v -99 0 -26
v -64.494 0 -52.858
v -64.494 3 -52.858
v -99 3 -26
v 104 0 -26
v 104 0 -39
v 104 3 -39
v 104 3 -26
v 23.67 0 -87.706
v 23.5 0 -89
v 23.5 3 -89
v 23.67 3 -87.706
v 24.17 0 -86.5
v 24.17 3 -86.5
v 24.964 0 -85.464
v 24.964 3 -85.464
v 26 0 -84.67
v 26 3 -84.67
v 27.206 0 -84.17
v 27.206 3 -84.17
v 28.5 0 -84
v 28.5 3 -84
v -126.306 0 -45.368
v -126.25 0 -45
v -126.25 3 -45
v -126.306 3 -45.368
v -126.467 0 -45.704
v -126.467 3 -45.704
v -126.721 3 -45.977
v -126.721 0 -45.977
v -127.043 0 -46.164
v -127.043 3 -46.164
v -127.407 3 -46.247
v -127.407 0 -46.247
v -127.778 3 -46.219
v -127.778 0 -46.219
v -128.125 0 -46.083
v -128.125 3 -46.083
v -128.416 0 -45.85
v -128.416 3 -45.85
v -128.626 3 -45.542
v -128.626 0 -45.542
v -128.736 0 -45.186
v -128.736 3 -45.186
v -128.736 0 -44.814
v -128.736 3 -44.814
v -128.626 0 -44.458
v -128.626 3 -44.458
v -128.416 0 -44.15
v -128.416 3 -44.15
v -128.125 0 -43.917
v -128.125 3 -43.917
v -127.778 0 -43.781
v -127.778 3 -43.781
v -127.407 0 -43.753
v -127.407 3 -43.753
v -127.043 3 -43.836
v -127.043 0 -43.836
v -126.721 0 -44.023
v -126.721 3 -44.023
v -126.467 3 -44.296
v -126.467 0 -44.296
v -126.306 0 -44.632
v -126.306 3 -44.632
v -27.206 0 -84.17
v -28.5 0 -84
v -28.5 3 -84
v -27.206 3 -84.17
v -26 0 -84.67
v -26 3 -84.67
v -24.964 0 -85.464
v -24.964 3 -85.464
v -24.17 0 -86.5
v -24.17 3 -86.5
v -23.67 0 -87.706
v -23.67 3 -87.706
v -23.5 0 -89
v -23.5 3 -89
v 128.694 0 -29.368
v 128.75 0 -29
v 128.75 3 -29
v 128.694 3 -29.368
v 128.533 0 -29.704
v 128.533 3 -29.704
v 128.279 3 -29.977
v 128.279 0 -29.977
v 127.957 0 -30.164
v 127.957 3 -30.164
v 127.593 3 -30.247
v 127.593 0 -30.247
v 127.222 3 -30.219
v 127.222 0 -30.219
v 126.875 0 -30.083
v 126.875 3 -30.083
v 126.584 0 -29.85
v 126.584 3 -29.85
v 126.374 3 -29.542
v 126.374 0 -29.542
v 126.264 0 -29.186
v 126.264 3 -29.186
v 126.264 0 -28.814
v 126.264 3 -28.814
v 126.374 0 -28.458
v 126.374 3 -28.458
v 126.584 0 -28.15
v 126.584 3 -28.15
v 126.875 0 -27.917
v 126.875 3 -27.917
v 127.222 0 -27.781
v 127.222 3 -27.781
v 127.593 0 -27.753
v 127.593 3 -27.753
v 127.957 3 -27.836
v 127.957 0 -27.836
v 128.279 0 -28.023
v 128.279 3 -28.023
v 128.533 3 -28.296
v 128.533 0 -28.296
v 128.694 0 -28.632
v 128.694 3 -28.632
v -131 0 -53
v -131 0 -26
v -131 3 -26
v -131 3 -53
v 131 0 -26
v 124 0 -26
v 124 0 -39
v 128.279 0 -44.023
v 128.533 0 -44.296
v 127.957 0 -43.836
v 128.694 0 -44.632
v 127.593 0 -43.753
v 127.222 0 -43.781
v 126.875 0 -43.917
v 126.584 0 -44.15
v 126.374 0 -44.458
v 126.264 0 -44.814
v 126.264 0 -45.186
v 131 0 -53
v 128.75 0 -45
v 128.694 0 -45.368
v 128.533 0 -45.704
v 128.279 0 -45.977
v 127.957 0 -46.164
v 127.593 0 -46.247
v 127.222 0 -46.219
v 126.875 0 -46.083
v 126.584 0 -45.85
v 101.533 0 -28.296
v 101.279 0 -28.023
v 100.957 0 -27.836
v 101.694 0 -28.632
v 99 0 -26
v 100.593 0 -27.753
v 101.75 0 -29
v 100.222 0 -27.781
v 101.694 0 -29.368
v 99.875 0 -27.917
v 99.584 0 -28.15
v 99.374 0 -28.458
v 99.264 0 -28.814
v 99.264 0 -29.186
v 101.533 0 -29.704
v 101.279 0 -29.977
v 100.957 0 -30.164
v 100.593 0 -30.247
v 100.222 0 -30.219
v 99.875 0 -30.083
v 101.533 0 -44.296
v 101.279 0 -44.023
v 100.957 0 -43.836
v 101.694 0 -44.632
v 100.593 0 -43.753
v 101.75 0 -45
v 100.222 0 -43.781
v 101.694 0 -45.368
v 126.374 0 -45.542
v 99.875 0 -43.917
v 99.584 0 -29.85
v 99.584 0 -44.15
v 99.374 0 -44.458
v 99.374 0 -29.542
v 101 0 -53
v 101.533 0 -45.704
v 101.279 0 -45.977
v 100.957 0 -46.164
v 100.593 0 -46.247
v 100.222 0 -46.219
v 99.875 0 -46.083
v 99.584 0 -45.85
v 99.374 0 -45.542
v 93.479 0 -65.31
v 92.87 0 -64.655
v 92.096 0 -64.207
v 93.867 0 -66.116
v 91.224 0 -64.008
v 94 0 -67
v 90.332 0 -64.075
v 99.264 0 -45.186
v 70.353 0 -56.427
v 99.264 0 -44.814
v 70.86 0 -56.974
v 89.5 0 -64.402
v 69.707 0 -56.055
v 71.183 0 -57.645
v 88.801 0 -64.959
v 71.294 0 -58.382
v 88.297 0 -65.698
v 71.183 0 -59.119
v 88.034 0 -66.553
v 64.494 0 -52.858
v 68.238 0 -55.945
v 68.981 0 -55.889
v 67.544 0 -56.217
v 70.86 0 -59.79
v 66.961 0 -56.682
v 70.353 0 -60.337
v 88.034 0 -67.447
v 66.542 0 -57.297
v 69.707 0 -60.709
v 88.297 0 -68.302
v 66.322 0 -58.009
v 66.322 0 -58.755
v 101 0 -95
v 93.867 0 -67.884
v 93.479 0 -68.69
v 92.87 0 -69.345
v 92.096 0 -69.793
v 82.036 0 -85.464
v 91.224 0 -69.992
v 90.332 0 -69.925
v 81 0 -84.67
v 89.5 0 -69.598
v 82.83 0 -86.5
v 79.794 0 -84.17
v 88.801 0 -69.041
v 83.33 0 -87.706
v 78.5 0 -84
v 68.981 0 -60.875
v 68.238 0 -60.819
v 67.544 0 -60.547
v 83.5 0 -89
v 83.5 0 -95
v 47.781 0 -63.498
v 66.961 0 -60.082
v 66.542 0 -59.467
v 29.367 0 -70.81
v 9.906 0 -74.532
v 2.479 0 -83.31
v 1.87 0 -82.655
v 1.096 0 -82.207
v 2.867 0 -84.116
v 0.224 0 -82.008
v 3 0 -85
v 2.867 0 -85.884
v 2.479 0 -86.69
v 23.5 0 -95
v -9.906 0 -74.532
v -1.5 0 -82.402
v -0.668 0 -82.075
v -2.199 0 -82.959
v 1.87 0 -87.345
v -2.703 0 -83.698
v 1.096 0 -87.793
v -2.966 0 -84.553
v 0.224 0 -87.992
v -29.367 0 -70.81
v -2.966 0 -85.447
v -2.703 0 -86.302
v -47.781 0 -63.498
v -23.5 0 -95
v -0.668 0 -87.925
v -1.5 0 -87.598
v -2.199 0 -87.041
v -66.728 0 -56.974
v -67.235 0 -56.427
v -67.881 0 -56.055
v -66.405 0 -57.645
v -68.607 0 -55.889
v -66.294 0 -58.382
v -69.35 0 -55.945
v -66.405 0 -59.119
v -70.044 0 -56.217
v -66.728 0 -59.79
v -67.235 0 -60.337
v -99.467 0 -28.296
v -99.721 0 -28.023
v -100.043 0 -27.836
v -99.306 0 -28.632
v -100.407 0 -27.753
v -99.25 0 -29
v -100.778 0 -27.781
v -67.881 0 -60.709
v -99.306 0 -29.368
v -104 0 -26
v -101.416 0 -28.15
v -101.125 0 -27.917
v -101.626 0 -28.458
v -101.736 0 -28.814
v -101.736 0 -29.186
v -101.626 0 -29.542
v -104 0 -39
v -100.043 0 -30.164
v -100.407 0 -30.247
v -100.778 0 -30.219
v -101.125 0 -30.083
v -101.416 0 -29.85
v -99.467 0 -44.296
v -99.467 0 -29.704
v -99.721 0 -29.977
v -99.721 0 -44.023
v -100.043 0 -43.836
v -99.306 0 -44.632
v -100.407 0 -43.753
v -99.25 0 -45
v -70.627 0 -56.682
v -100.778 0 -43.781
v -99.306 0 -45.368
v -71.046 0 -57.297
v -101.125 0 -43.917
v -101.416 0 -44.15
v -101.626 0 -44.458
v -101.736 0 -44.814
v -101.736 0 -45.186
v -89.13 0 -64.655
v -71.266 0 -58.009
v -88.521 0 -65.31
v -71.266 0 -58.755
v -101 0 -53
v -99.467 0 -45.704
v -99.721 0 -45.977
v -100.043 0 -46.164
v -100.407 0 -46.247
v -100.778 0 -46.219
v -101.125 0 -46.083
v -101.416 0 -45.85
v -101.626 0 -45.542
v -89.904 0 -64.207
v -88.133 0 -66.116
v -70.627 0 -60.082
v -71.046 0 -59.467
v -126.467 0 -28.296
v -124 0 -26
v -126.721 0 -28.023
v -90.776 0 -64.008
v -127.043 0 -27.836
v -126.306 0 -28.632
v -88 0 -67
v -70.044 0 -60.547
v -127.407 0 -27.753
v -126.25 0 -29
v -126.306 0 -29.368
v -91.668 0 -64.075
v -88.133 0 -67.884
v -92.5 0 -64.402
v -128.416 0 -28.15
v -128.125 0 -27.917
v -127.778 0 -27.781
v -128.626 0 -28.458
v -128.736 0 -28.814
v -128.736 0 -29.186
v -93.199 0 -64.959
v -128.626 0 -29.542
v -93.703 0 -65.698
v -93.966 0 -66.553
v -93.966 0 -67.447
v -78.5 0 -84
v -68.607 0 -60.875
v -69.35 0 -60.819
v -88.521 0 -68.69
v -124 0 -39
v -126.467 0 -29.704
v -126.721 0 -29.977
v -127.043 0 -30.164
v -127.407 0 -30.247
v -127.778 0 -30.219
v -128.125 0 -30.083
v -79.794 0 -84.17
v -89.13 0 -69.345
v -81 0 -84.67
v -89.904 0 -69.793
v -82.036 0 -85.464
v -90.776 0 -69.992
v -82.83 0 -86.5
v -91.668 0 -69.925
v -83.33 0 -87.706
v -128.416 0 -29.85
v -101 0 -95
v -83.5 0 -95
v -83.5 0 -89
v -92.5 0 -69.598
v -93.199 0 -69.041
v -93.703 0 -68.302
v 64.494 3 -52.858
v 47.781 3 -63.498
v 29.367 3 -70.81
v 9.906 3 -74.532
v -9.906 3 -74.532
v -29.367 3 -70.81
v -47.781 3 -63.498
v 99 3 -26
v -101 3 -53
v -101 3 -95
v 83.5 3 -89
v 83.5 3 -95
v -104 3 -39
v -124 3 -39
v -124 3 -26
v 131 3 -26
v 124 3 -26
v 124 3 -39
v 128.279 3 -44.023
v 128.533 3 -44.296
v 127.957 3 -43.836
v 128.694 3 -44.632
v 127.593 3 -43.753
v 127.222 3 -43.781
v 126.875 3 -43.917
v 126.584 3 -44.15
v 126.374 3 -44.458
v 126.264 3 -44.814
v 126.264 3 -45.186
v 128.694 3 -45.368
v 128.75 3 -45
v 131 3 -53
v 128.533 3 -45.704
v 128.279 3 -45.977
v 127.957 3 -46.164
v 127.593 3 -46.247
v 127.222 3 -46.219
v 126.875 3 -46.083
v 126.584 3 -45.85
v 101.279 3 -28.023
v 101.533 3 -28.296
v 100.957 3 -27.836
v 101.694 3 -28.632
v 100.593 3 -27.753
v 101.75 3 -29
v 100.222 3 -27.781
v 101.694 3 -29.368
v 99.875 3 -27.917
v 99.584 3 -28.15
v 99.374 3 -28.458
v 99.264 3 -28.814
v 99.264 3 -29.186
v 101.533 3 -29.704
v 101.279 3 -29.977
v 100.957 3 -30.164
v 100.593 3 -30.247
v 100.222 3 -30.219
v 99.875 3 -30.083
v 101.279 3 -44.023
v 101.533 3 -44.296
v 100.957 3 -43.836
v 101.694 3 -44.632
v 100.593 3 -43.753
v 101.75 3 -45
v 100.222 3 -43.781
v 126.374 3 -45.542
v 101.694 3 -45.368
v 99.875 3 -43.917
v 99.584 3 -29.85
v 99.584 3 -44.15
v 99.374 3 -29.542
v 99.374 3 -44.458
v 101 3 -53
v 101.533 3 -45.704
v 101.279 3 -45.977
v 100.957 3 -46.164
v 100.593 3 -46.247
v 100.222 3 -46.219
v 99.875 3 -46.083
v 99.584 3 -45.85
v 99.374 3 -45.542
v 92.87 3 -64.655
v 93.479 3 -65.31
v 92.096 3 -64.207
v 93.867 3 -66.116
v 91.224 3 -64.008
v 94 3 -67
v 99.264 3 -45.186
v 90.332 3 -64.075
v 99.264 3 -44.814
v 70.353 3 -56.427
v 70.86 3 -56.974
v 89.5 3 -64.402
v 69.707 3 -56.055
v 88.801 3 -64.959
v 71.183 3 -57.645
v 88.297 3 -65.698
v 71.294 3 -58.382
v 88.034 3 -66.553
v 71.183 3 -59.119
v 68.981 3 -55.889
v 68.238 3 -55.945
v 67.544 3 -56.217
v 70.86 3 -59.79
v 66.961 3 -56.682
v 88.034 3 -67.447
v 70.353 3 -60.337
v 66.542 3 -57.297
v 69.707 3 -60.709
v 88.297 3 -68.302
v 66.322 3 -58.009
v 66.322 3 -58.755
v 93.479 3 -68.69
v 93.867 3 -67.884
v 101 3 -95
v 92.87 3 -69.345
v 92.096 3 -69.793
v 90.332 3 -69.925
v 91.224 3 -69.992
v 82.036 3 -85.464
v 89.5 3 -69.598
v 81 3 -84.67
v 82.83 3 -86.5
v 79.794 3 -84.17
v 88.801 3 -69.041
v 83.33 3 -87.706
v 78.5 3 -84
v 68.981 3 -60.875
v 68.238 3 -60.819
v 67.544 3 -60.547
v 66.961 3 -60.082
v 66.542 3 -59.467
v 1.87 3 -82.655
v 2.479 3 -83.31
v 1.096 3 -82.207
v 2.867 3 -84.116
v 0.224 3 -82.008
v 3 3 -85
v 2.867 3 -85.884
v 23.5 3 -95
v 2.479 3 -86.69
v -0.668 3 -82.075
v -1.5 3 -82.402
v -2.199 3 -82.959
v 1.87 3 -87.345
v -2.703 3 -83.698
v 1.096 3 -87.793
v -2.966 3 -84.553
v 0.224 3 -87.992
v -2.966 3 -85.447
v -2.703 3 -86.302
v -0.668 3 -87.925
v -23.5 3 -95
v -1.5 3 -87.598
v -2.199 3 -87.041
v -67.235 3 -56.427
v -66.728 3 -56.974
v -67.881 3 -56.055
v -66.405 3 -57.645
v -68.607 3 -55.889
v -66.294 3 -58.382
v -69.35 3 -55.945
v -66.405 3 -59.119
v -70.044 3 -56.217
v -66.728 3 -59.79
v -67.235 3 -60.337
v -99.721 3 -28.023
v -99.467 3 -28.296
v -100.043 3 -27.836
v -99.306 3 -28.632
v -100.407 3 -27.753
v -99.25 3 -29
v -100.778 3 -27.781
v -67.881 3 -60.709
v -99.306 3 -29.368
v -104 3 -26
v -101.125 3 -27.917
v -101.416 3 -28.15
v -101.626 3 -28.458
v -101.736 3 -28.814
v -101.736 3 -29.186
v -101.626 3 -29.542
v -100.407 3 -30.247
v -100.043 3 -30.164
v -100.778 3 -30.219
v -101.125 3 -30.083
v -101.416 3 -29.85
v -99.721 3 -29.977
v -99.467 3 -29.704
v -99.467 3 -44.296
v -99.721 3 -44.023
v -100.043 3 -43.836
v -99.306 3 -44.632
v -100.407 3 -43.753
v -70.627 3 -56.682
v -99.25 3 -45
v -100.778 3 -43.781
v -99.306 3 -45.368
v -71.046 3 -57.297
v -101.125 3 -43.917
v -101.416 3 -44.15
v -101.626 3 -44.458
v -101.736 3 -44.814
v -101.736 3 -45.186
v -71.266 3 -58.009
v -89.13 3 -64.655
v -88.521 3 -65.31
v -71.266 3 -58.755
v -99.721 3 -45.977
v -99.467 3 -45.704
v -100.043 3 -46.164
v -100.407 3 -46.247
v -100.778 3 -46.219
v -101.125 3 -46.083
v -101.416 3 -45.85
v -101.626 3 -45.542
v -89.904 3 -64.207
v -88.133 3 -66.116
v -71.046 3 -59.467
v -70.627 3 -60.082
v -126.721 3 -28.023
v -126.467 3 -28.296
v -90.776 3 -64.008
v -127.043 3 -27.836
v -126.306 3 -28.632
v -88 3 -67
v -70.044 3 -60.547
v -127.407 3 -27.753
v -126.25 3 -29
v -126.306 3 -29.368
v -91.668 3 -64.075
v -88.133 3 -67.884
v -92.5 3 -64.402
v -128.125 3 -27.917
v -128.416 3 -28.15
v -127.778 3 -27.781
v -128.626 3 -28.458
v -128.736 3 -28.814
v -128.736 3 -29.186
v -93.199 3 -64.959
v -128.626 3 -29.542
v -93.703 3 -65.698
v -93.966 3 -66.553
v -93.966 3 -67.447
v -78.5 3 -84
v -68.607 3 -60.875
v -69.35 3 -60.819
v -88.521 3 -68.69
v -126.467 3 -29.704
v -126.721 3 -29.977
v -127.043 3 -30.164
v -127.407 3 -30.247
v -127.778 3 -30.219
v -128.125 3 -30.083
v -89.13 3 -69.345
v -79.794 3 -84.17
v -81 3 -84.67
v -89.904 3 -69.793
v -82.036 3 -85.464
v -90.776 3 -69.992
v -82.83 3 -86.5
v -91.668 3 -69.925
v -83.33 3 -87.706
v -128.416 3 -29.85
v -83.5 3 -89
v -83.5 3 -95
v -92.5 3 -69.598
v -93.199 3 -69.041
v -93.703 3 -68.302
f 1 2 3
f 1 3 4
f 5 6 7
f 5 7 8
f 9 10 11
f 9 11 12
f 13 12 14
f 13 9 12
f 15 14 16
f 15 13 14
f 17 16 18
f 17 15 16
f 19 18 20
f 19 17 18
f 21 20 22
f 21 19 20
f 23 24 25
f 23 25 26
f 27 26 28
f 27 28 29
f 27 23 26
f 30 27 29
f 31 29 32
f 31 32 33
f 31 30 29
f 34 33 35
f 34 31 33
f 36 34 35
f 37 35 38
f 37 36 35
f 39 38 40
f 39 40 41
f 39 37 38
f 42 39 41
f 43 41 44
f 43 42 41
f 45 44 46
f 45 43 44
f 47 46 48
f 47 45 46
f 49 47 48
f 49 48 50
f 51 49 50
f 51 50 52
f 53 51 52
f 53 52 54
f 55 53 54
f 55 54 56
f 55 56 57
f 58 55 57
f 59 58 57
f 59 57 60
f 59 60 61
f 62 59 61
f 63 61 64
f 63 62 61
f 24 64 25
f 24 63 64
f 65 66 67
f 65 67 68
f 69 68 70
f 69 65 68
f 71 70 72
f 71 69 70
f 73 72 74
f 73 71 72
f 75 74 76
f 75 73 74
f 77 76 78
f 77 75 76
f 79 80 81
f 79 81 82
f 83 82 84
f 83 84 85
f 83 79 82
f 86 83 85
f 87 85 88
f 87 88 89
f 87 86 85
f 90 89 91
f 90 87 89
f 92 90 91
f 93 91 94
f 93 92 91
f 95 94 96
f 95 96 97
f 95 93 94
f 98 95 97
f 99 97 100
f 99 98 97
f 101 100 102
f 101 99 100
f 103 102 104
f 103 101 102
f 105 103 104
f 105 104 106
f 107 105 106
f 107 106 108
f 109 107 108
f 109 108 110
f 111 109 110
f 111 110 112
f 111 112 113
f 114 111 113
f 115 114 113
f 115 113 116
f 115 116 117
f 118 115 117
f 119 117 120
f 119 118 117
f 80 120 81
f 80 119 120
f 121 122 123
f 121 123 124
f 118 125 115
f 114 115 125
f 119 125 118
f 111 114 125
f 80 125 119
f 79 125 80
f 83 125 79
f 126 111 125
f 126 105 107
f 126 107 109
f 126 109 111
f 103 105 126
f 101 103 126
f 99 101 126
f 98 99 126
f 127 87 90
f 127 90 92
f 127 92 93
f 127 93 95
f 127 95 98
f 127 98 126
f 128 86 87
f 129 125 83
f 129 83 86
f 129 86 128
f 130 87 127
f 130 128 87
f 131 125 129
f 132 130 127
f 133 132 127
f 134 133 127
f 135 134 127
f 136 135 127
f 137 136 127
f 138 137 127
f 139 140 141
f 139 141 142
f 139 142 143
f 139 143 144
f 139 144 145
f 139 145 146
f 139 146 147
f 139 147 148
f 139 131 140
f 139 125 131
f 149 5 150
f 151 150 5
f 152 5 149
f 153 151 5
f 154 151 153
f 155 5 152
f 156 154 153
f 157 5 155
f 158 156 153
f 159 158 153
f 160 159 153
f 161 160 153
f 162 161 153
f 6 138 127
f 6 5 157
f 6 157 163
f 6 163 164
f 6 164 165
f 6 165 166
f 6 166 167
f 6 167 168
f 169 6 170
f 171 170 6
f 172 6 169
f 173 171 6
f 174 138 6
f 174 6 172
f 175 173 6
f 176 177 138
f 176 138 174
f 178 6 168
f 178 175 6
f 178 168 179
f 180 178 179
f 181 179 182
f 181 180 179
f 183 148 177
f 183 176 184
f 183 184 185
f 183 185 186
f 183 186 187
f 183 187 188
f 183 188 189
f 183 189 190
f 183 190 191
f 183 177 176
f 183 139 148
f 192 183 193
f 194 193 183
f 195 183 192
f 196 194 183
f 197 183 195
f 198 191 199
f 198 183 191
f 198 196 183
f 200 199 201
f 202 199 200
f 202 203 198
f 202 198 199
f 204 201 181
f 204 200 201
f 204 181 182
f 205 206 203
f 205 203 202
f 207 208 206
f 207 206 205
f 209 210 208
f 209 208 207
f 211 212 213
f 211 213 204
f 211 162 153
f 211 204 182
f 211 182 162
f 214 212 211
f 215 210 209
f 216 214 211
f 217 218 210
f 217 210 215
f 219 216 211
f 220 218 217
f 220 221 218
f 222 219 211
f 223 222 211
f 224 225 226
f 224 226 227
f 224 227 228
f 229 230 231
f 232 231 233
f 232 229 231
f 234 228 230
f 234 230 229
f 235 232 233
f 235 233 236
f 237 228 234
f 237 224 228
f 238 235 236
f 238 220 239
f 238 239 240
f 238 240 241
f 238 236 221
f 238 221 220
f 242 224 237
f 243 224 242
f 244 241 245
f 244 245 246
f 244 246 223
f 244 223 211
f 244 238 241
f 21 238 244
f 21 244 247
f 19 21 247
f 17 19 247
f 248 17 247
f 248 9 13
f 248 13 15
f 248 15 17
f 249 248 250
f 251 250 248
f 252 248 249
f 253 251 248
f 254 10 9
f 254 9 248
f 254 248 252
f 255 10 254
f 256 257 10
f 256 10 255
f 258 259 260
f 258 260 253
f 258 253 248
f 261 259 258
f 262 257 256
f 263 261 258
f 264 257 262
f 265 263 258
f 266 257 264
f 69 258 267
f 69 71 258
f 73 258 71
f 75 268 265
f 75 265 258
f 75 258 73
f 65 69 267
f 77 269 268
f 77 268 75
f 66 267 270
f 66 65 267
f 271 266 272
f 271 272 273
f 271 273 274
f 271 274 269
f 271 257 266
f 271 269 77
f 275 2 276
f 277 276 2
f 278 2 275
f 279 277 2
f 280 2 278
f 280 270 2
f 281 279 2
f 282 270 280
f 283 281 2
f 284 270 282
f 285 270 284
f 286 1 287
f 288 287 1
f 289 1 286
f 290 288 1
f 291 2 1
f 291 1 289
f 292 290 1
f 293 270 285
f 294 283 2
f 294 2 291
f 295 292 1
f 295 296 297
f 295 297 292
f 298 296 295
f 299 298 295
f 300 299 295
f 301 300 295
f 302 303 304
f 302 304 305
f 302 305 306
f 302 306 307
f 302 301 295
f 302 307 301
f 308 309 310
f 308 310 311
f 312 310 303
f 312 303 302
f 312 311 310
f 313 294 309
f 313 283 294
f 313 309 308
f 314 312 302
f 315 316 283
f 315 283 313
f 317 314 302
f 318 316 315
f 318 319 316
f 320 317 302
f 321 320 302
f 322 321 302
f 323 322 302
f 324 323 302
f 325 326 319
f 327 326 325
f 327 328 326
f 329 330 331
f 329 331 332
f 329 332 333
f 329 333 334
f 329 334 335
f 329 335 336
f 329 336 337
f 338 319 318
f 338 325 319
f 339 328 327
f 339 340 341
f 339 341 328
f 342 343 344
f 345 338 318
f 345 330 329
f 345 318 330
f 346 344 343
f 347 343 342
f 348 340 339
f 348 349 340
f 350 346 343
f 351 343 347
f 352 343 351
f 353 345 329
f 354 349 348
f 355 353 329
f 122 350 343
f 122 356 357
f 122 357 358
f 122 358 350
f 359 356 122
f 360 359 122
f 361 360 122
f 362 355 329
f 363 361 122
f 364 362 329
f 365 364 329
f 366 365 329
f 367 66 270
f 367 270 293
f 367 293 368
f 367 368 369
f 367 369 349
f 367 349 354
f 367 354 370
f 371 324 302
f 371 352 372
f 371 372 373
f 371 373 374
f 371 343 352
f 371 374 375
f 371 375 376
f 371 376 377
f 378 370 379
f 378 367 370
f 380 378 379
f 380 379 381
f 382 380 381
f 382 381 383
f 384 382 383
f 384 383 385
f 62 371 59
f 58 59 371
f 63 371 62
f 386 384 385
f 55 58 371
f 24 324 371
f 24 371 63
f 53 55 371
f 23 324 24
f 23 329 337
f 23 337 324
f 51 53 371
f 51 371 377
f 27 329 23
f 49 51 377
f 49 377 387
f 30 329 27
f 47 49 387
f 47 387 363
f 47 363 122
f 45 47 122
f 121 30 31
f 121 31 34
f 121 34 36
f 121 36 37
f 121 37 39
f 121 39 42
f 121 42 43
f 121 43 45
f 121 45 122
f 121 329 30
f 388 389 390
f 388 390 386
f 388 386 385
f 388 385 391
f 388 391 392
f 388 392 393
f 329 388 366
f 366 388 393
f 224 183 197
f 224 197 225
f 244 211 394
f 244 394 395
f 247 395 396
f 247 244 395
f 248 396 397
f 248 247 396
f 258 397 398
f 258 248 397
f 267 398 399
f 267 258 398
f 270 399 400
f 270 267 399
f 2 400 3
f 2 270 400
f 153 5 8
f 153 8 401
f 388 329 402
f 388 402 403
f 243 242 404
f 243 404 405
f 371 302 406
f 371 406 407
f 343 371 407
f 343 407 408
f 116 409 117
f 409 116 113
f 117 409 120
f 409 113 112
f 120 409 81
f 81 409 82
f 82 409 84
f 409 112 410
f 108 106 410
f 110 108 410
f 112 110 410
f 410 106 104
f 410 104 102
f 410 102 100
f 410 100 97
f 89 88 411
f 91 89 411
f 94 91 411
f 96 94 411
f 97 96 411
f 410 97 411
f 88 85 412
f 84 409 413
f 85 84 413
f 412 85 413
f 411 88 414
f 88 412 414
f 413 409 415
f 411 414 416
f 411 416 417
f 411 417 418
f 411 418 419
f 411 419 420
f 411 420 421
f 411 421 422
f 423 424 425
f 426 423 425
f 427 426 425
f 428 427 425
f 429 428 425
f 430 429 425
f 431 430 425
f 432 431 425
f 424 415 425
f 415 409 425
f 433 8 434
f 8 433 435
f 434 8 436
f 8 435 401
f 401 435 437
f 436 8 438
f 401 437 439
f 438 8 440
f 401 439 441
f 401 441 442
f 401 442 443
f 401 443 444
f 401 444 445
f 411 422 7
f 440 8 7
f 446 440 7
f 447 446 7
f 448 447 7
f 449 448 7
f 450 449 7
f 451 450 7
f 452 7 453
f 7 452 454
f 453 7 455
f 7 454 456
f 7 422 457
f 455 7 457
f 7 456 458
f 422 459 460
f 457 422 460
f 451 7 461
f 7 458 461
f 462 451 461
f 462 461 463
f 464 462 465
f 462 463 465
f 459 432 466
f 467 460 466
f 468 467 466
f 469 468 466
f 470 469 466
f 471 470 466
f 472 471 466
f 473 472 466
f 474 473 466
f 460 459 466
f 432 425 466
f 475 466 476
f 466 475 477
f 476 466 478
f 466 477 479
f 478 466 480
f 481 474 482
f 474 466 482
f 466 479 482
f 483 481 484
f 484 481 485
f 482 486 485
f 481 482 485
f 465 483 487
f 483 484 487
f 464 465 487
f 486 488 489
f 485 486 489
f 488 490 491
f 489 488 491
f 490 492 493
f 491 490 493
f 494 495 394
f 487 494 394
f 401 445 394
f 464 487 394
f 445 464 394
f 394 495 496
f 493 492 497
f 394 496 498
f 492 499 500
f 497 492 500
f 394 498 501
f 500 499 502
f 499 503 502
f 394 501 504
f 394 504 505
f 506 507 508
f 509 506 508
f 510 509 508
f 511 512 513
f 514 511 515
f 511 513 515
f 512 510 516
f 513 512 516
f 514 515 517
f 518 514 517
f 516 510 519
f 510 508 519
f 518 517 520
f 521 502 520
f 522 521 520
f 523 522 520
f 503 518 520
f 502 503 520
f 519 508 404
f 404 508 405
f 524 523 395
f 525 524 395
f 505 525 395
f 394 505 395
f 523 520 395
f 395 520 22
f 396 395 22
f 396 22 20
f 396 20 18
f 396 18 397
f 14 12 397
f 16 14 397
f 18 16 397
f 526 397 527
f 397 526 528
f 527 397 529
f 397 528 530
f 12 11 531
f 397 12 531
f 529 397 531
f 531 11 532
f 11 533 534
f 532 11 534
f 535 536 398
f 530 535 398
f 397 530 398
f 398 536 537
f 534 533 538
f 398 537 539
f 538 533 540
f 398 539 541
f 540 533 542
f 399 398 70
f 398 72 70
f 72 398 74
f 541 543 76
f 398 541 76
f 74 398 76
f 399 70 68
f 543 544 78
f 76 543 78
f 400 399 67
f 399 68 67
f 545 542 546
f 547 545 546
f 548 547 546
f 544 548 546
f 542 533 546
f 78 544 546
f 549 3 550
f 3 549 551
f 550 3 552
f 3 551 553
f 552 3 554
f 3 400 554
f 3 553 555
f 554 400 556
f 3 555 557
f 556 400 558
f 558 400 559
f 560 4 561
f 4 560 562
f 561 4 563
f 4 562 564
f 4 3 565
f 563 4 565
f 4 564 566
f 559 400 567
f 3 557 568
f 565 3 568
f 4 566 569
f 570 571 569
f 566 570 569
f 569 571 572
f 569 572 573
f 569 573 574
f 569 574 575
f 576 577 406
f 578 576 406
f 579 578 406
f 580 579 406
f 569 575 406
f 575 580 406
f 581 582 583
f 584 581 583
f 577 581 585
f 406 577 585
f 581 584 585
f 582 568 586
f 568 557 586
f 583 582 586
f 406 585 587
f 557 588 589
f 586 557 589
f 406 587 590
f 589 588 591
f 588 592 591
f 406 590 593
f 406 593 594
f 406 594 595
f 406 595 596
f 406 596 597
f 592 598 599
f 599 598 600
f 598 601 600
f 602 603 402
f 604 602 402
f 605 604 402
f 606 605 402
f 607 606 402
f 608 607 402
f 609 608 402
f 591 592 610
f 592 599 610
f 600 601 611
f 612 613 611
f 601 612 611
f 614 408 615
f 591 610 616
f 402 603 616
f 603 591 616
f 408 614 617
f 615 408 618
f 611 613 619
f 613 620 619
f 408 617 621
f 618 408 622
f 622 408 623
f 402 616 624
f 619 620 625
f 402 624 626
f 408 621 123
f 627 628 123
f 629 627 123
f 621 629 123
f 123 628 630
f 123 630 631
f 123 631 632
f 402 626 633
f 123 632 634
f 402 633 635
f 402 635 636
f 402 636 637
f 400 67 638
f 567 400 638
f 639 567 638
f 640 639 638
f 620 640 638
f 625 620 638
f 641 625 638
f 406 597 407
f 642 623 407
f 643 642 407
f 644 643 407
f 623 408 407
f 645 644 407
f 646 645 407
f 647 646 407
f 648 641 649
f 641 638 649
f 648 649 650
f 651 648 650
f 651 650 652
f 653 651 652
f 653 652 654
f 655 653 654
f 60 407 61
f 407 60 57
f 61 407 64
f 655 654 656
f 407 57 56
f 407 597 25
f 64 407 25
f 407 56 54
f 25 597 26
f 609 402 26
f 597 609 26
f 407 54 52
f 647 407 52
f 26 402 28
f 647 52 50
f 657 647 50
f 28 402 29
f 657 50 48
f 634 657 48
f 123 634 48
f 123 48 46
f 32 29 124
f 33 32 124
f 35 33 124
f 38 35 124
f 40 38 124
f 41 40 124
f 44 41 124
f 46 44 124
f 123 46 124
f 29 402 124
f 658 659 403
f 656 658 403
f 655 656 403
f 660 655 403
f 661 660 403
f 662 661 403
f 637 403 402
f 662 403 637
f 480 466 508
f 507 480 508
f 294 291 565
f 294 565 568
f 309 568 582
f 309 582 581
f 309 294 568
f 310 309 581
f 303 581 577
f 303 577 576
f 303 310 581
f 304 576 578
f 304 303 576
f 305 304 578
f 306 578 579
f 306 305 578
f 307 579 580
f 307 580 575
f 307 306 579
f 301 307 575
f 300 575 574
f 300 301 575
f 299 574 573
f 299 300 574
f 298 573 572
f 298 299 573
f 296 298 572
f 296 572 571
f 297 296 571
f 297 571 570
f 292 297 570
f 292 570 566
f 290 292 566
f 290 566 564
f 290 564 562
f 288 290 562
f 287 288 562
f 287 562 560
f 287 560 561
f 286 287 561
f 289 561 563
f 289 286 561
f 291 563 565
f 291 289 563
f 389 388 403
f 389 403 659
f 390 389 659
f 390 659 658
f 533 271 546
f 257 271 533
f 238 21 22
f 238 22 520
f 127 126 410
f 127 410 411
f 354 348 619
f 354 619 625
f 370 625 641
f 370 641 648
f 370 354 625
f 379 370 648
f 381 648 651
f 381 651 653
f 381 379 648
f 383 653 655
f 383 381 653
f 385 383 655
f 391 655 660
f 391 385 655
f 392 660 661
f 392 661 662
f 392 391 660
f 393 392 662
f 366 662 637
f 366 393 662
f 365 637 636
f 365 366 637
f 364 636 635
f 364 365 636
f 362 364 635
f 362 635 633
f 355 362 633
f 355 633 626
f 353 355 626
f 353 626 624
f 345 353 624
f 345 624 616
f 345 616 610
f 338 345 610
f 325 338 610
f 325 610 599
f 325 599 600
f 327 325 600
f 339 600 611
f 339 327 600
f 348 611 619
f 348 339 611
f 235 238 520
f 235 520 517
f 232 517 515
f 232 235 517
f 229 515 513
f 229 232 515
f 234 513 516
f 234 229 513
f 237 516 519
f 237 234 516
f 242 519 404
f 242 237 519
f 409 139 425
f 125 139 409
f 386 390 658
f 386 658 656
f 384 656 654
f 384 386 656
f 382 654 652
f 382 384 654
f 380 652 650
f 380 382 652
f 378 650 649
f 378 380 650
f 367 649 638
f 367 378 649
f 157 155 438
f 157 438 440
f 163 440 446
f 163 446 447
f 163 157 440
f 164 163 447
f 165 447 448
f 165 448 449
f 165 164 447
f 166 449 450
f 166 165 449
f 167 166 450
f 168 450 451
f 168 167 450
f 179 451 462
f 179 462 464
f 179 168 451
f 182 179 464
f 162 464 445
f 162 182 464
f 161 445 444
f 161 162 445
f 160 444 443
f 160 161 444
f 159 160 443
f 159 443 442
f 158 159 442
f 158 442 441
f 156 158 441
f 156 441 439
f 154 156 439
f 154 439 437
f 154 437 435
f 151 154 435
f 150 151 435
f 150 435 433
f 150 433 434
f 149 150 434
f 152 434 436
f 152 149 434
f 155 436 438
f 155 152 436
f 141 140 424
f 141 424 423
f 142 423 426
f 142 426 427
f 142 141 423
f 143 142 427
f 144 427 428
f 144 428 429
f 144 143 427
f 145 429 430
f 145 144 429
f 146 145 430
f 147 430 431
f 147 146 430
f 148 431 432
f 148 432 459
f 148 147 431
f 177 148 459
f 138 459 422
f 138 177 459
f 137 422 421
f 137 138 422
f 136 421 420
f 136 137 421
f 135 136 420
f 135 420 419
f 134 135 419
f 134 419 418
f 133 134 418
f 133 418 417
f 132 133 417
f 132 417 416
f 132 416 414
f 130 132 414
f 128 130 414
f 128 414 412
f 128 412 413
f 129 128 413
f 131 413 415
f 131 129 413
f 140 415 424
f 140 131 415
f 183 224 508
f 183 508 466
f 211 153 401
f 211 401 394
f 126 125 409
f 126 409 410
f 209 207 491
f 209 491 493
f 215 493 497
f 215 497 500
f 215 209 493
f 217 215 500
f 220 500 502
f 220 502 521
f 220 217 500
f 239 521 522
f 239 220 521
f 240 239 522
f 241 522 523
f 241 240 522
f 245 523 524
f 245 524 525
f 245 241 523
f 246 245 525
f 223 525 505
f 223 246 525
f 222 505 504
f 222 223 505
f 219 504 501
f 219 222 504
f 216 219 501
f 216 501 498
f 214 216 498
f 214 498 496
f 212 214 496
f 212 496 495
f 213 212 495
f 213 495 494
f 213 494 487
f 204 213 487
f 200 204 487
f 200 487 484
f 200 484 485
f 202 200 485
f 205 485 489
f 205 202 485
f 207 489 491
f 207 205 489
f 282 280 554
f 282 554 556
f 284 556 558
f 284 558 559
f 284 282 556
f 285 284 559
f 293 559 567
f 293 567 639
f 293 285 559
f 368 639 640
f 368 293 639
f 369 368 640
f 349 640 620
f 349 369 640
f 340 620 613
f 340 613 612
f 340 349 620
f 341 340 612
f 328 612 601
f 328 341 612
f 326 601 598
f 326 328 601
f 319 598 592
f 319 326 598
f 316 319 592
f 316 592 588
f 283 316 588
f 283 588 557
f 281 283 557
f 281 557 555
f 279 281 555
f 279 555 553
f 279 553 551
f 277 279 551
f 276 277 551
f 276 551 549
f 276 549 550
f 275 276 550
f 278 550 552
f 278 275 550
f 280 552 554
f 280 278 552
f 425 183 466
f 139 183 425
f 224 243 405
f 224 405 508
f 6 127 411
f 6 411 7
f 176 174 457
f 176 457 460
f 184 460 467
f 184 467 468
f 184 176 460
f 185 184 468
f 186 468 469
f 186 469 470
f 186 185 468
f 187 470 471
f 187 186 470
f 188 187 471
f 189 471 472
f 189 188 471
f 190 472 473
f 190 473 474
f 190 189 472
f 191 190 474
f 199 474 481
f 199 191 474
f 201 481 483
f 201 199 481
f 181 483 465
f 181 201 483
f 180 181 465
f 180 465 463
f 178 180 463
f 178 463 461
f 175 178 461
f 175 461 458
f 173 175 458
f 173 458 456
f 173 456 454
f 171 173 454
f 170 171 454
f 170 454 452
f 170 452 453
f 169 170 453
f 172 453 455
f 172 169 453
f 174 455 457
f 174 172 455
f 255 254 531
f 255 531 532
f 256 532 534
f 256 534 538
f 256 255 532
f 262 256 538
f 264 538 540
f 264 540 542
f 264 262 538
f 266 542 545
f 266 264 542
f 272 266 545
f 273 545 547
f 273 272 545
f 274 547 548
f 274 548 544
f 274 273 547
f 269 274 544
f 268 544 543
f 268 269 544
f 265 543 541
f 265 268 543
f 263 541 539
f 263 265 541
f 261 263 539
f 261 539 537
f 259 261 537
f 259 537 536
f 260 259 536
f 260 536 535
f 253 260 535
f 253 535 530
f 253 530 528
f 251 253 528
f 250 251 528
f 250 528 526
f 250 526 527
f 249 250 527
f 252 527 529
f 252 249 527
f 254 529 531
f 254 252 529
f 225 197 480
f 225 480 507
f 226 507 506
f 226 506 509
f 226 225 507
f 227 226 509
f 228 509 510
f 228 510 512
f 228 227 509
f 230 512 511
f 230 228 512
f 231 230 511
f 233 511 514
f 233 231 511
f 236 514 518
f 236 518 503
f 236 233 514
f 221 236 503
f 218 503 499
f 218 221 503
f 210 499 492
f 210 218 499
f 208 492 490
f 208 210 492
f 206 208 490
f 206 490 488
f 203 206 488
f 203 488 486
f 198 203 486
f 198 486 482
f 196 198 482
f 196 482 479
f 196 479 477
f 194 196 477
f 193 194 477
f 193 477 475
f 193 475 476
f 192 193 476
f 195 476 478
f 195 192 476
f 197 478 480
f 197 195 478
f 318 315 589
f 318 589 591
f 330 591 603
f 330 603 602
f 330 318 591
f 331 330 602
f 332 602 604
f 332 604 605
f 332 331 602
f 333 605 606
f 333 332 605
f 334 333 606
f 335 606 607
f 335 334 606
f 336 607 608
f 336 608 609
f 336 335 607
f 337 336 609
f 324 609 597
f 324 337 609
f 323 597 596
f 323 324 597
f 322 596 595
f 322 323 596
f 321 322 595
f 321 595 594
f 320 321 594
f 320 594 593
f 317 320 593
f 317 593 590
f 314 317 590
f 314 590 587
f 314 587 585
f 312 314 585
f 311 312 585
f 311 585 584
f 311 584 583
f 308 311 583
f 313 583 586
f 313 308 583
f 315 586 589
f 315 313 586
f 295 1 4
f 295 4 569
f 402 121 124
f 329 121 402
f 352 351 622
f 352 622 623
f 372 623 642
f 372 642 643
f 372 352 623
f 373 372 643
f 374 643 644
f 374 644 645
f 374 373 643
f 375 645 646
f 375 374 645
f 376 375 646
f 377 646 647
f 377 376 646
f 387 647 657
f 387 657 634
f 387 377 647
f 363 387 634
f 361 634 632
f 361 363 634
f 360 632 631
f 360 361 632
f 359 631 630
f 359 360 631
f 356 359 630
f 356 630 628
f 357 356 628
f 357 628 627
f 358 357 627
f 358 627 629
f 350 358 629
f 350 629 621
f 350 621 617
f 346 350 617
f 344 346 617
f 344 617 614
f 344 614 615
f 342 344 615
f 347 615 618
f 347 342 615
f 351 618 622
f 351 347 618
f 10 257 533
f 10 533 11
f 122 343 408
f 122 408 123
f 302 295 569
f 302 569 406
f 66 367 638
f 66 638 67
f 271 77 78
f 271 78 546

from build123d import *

# Parameters (mm, degrees)
ESQUISSE1_R      = 3
ESQUISSE1_R_2    = 1.25
ESQUISSE1_R_3    = 2.5
EXTRUSION1_DEPTH = 3


with BuildPart() as part:
    # Esquisse1 → Extrusion1 (new body)
    with BuildSketch(Plane(origin=(0, 0, 0), x_dir=(1, 0, 0), z_dir=(0, 1, 0))):
        with BuildLine():
            Line((-64.494367887, 52.858171056), (-99, 26))
            Line((-99, 26), (-104, 26))
            Line((-104, 26), (-104, 39))
            Line((-104, 39), (-124, 39))
            Line((-124, 39), (-124, 26))
            Line((-124, 26), (-131, 26))
            Line((-131, 26), (-131, 53))
            Line((-131, 53), (-101, 53))
            Line((-101, 53), (-101, 95))
            Line((-101, 95), (-83.5, 95))
            Line((-83.5, 95), (-83.5, 89))
            ThreePointArc((-83.5, 89), (-82.035533906, 85.464466094), (-78.5, 84))
            Line((-78.5, 84), (-28.5, 84))
            ThreePointArc((-28.5, 84), (-24.964466094, 85.464466094), (-23.5, 89))
            Line((-23.5, 89), (-23.5, 95))
            Line((-23.5, 95), (23.5, 95))
            Line((23.5, 95), (23.5, 89))
            ThreePointArc((23.5, 89), (24.964466094, 85.464466094), (28.5, 84))
            Line((28.5, 84), (78.5, 84))
            ThreePointArc((78.5, 84), (82.035533906, 85.464466094), (83.5, 89))
            Line((83.5, 89), (83.5, 95))
            Line((83.5, 95), (101, 95))
            Line((101, 95), (101, 53))
            Line((101, 53), (131, 53))
            Line((131, 53), (131, 26))
            Line((131, 26), (124, 26))
            Line((124, 26), (124, 39))
            Line((124, 39), (104, 39))
            Line((104, 39), (104, 26))
            Line((104, 26), (99, 26))
            Line((99, 26), (64.494367887, 52.858171056))
            ThreePointArc((64.494367887, 52.858171056), (0, 75), (-64.494367887, 52.858171056))
        make_face()
        with Locations((-91, 67)):
            Circle(ESQUISSE1_R, mode=Mode.SUBTRACT)
        with Locations((91, 67)):
            Circle(ESQUISSE1_R, mode=Mode.SUBTRACT)
        with Locations((-127.5, 45)):
            Circle(ESQUISSE1_R_2, mode=Mode.SUBTRACT)
        with Locations((-100.5, 45)):
            Circle(ESQUISSE1_R_2, mode=Mode.SUBTRACT)
        with Locations((-68.793992413, 58.382049127)):
            Circle(ESQUISSE1_R_3, mode=Mode.SUBTRACT)
        with Locations((68.793992413, 58.382049127)):
            Circle(ESQUISSE1_R_3, mode=Mode.SUBTRACT)
        with Locations((0, 85)):
            Circle(ESQUISSE1_R, mode=Mode.SUBTRACT)
        with Locations((-127.5, 29)):
            Circle(ESQUISSE1_R_2, mode=Mode.SUBTRACT)
        with Locations((-100.5, 29)):
            Circle(ESQUISSE1_R_2, mode=Mode.SUBTRACT)
        with Locations((100.5, 45)):
            Circle(ESQUISSE1_R_2, mode=Mode.SUBTRACT)
        with Locations((100.5, 29)):
            Circle(ESQUISSE1_R_2, mode=Mode.SUBTRACT)
        with Locations((127.5, 29)):
            Circle(ESQUISSE1_R_2, mode=Mode.SUBTRACT)
        with Locations((127.5, 45)):
            Circle(ESQUISSE1_R_2, mode=Mode.SUBTRACT)
    extrude(amount=EXTRUSION1_DEPTH)


solid = part.part
